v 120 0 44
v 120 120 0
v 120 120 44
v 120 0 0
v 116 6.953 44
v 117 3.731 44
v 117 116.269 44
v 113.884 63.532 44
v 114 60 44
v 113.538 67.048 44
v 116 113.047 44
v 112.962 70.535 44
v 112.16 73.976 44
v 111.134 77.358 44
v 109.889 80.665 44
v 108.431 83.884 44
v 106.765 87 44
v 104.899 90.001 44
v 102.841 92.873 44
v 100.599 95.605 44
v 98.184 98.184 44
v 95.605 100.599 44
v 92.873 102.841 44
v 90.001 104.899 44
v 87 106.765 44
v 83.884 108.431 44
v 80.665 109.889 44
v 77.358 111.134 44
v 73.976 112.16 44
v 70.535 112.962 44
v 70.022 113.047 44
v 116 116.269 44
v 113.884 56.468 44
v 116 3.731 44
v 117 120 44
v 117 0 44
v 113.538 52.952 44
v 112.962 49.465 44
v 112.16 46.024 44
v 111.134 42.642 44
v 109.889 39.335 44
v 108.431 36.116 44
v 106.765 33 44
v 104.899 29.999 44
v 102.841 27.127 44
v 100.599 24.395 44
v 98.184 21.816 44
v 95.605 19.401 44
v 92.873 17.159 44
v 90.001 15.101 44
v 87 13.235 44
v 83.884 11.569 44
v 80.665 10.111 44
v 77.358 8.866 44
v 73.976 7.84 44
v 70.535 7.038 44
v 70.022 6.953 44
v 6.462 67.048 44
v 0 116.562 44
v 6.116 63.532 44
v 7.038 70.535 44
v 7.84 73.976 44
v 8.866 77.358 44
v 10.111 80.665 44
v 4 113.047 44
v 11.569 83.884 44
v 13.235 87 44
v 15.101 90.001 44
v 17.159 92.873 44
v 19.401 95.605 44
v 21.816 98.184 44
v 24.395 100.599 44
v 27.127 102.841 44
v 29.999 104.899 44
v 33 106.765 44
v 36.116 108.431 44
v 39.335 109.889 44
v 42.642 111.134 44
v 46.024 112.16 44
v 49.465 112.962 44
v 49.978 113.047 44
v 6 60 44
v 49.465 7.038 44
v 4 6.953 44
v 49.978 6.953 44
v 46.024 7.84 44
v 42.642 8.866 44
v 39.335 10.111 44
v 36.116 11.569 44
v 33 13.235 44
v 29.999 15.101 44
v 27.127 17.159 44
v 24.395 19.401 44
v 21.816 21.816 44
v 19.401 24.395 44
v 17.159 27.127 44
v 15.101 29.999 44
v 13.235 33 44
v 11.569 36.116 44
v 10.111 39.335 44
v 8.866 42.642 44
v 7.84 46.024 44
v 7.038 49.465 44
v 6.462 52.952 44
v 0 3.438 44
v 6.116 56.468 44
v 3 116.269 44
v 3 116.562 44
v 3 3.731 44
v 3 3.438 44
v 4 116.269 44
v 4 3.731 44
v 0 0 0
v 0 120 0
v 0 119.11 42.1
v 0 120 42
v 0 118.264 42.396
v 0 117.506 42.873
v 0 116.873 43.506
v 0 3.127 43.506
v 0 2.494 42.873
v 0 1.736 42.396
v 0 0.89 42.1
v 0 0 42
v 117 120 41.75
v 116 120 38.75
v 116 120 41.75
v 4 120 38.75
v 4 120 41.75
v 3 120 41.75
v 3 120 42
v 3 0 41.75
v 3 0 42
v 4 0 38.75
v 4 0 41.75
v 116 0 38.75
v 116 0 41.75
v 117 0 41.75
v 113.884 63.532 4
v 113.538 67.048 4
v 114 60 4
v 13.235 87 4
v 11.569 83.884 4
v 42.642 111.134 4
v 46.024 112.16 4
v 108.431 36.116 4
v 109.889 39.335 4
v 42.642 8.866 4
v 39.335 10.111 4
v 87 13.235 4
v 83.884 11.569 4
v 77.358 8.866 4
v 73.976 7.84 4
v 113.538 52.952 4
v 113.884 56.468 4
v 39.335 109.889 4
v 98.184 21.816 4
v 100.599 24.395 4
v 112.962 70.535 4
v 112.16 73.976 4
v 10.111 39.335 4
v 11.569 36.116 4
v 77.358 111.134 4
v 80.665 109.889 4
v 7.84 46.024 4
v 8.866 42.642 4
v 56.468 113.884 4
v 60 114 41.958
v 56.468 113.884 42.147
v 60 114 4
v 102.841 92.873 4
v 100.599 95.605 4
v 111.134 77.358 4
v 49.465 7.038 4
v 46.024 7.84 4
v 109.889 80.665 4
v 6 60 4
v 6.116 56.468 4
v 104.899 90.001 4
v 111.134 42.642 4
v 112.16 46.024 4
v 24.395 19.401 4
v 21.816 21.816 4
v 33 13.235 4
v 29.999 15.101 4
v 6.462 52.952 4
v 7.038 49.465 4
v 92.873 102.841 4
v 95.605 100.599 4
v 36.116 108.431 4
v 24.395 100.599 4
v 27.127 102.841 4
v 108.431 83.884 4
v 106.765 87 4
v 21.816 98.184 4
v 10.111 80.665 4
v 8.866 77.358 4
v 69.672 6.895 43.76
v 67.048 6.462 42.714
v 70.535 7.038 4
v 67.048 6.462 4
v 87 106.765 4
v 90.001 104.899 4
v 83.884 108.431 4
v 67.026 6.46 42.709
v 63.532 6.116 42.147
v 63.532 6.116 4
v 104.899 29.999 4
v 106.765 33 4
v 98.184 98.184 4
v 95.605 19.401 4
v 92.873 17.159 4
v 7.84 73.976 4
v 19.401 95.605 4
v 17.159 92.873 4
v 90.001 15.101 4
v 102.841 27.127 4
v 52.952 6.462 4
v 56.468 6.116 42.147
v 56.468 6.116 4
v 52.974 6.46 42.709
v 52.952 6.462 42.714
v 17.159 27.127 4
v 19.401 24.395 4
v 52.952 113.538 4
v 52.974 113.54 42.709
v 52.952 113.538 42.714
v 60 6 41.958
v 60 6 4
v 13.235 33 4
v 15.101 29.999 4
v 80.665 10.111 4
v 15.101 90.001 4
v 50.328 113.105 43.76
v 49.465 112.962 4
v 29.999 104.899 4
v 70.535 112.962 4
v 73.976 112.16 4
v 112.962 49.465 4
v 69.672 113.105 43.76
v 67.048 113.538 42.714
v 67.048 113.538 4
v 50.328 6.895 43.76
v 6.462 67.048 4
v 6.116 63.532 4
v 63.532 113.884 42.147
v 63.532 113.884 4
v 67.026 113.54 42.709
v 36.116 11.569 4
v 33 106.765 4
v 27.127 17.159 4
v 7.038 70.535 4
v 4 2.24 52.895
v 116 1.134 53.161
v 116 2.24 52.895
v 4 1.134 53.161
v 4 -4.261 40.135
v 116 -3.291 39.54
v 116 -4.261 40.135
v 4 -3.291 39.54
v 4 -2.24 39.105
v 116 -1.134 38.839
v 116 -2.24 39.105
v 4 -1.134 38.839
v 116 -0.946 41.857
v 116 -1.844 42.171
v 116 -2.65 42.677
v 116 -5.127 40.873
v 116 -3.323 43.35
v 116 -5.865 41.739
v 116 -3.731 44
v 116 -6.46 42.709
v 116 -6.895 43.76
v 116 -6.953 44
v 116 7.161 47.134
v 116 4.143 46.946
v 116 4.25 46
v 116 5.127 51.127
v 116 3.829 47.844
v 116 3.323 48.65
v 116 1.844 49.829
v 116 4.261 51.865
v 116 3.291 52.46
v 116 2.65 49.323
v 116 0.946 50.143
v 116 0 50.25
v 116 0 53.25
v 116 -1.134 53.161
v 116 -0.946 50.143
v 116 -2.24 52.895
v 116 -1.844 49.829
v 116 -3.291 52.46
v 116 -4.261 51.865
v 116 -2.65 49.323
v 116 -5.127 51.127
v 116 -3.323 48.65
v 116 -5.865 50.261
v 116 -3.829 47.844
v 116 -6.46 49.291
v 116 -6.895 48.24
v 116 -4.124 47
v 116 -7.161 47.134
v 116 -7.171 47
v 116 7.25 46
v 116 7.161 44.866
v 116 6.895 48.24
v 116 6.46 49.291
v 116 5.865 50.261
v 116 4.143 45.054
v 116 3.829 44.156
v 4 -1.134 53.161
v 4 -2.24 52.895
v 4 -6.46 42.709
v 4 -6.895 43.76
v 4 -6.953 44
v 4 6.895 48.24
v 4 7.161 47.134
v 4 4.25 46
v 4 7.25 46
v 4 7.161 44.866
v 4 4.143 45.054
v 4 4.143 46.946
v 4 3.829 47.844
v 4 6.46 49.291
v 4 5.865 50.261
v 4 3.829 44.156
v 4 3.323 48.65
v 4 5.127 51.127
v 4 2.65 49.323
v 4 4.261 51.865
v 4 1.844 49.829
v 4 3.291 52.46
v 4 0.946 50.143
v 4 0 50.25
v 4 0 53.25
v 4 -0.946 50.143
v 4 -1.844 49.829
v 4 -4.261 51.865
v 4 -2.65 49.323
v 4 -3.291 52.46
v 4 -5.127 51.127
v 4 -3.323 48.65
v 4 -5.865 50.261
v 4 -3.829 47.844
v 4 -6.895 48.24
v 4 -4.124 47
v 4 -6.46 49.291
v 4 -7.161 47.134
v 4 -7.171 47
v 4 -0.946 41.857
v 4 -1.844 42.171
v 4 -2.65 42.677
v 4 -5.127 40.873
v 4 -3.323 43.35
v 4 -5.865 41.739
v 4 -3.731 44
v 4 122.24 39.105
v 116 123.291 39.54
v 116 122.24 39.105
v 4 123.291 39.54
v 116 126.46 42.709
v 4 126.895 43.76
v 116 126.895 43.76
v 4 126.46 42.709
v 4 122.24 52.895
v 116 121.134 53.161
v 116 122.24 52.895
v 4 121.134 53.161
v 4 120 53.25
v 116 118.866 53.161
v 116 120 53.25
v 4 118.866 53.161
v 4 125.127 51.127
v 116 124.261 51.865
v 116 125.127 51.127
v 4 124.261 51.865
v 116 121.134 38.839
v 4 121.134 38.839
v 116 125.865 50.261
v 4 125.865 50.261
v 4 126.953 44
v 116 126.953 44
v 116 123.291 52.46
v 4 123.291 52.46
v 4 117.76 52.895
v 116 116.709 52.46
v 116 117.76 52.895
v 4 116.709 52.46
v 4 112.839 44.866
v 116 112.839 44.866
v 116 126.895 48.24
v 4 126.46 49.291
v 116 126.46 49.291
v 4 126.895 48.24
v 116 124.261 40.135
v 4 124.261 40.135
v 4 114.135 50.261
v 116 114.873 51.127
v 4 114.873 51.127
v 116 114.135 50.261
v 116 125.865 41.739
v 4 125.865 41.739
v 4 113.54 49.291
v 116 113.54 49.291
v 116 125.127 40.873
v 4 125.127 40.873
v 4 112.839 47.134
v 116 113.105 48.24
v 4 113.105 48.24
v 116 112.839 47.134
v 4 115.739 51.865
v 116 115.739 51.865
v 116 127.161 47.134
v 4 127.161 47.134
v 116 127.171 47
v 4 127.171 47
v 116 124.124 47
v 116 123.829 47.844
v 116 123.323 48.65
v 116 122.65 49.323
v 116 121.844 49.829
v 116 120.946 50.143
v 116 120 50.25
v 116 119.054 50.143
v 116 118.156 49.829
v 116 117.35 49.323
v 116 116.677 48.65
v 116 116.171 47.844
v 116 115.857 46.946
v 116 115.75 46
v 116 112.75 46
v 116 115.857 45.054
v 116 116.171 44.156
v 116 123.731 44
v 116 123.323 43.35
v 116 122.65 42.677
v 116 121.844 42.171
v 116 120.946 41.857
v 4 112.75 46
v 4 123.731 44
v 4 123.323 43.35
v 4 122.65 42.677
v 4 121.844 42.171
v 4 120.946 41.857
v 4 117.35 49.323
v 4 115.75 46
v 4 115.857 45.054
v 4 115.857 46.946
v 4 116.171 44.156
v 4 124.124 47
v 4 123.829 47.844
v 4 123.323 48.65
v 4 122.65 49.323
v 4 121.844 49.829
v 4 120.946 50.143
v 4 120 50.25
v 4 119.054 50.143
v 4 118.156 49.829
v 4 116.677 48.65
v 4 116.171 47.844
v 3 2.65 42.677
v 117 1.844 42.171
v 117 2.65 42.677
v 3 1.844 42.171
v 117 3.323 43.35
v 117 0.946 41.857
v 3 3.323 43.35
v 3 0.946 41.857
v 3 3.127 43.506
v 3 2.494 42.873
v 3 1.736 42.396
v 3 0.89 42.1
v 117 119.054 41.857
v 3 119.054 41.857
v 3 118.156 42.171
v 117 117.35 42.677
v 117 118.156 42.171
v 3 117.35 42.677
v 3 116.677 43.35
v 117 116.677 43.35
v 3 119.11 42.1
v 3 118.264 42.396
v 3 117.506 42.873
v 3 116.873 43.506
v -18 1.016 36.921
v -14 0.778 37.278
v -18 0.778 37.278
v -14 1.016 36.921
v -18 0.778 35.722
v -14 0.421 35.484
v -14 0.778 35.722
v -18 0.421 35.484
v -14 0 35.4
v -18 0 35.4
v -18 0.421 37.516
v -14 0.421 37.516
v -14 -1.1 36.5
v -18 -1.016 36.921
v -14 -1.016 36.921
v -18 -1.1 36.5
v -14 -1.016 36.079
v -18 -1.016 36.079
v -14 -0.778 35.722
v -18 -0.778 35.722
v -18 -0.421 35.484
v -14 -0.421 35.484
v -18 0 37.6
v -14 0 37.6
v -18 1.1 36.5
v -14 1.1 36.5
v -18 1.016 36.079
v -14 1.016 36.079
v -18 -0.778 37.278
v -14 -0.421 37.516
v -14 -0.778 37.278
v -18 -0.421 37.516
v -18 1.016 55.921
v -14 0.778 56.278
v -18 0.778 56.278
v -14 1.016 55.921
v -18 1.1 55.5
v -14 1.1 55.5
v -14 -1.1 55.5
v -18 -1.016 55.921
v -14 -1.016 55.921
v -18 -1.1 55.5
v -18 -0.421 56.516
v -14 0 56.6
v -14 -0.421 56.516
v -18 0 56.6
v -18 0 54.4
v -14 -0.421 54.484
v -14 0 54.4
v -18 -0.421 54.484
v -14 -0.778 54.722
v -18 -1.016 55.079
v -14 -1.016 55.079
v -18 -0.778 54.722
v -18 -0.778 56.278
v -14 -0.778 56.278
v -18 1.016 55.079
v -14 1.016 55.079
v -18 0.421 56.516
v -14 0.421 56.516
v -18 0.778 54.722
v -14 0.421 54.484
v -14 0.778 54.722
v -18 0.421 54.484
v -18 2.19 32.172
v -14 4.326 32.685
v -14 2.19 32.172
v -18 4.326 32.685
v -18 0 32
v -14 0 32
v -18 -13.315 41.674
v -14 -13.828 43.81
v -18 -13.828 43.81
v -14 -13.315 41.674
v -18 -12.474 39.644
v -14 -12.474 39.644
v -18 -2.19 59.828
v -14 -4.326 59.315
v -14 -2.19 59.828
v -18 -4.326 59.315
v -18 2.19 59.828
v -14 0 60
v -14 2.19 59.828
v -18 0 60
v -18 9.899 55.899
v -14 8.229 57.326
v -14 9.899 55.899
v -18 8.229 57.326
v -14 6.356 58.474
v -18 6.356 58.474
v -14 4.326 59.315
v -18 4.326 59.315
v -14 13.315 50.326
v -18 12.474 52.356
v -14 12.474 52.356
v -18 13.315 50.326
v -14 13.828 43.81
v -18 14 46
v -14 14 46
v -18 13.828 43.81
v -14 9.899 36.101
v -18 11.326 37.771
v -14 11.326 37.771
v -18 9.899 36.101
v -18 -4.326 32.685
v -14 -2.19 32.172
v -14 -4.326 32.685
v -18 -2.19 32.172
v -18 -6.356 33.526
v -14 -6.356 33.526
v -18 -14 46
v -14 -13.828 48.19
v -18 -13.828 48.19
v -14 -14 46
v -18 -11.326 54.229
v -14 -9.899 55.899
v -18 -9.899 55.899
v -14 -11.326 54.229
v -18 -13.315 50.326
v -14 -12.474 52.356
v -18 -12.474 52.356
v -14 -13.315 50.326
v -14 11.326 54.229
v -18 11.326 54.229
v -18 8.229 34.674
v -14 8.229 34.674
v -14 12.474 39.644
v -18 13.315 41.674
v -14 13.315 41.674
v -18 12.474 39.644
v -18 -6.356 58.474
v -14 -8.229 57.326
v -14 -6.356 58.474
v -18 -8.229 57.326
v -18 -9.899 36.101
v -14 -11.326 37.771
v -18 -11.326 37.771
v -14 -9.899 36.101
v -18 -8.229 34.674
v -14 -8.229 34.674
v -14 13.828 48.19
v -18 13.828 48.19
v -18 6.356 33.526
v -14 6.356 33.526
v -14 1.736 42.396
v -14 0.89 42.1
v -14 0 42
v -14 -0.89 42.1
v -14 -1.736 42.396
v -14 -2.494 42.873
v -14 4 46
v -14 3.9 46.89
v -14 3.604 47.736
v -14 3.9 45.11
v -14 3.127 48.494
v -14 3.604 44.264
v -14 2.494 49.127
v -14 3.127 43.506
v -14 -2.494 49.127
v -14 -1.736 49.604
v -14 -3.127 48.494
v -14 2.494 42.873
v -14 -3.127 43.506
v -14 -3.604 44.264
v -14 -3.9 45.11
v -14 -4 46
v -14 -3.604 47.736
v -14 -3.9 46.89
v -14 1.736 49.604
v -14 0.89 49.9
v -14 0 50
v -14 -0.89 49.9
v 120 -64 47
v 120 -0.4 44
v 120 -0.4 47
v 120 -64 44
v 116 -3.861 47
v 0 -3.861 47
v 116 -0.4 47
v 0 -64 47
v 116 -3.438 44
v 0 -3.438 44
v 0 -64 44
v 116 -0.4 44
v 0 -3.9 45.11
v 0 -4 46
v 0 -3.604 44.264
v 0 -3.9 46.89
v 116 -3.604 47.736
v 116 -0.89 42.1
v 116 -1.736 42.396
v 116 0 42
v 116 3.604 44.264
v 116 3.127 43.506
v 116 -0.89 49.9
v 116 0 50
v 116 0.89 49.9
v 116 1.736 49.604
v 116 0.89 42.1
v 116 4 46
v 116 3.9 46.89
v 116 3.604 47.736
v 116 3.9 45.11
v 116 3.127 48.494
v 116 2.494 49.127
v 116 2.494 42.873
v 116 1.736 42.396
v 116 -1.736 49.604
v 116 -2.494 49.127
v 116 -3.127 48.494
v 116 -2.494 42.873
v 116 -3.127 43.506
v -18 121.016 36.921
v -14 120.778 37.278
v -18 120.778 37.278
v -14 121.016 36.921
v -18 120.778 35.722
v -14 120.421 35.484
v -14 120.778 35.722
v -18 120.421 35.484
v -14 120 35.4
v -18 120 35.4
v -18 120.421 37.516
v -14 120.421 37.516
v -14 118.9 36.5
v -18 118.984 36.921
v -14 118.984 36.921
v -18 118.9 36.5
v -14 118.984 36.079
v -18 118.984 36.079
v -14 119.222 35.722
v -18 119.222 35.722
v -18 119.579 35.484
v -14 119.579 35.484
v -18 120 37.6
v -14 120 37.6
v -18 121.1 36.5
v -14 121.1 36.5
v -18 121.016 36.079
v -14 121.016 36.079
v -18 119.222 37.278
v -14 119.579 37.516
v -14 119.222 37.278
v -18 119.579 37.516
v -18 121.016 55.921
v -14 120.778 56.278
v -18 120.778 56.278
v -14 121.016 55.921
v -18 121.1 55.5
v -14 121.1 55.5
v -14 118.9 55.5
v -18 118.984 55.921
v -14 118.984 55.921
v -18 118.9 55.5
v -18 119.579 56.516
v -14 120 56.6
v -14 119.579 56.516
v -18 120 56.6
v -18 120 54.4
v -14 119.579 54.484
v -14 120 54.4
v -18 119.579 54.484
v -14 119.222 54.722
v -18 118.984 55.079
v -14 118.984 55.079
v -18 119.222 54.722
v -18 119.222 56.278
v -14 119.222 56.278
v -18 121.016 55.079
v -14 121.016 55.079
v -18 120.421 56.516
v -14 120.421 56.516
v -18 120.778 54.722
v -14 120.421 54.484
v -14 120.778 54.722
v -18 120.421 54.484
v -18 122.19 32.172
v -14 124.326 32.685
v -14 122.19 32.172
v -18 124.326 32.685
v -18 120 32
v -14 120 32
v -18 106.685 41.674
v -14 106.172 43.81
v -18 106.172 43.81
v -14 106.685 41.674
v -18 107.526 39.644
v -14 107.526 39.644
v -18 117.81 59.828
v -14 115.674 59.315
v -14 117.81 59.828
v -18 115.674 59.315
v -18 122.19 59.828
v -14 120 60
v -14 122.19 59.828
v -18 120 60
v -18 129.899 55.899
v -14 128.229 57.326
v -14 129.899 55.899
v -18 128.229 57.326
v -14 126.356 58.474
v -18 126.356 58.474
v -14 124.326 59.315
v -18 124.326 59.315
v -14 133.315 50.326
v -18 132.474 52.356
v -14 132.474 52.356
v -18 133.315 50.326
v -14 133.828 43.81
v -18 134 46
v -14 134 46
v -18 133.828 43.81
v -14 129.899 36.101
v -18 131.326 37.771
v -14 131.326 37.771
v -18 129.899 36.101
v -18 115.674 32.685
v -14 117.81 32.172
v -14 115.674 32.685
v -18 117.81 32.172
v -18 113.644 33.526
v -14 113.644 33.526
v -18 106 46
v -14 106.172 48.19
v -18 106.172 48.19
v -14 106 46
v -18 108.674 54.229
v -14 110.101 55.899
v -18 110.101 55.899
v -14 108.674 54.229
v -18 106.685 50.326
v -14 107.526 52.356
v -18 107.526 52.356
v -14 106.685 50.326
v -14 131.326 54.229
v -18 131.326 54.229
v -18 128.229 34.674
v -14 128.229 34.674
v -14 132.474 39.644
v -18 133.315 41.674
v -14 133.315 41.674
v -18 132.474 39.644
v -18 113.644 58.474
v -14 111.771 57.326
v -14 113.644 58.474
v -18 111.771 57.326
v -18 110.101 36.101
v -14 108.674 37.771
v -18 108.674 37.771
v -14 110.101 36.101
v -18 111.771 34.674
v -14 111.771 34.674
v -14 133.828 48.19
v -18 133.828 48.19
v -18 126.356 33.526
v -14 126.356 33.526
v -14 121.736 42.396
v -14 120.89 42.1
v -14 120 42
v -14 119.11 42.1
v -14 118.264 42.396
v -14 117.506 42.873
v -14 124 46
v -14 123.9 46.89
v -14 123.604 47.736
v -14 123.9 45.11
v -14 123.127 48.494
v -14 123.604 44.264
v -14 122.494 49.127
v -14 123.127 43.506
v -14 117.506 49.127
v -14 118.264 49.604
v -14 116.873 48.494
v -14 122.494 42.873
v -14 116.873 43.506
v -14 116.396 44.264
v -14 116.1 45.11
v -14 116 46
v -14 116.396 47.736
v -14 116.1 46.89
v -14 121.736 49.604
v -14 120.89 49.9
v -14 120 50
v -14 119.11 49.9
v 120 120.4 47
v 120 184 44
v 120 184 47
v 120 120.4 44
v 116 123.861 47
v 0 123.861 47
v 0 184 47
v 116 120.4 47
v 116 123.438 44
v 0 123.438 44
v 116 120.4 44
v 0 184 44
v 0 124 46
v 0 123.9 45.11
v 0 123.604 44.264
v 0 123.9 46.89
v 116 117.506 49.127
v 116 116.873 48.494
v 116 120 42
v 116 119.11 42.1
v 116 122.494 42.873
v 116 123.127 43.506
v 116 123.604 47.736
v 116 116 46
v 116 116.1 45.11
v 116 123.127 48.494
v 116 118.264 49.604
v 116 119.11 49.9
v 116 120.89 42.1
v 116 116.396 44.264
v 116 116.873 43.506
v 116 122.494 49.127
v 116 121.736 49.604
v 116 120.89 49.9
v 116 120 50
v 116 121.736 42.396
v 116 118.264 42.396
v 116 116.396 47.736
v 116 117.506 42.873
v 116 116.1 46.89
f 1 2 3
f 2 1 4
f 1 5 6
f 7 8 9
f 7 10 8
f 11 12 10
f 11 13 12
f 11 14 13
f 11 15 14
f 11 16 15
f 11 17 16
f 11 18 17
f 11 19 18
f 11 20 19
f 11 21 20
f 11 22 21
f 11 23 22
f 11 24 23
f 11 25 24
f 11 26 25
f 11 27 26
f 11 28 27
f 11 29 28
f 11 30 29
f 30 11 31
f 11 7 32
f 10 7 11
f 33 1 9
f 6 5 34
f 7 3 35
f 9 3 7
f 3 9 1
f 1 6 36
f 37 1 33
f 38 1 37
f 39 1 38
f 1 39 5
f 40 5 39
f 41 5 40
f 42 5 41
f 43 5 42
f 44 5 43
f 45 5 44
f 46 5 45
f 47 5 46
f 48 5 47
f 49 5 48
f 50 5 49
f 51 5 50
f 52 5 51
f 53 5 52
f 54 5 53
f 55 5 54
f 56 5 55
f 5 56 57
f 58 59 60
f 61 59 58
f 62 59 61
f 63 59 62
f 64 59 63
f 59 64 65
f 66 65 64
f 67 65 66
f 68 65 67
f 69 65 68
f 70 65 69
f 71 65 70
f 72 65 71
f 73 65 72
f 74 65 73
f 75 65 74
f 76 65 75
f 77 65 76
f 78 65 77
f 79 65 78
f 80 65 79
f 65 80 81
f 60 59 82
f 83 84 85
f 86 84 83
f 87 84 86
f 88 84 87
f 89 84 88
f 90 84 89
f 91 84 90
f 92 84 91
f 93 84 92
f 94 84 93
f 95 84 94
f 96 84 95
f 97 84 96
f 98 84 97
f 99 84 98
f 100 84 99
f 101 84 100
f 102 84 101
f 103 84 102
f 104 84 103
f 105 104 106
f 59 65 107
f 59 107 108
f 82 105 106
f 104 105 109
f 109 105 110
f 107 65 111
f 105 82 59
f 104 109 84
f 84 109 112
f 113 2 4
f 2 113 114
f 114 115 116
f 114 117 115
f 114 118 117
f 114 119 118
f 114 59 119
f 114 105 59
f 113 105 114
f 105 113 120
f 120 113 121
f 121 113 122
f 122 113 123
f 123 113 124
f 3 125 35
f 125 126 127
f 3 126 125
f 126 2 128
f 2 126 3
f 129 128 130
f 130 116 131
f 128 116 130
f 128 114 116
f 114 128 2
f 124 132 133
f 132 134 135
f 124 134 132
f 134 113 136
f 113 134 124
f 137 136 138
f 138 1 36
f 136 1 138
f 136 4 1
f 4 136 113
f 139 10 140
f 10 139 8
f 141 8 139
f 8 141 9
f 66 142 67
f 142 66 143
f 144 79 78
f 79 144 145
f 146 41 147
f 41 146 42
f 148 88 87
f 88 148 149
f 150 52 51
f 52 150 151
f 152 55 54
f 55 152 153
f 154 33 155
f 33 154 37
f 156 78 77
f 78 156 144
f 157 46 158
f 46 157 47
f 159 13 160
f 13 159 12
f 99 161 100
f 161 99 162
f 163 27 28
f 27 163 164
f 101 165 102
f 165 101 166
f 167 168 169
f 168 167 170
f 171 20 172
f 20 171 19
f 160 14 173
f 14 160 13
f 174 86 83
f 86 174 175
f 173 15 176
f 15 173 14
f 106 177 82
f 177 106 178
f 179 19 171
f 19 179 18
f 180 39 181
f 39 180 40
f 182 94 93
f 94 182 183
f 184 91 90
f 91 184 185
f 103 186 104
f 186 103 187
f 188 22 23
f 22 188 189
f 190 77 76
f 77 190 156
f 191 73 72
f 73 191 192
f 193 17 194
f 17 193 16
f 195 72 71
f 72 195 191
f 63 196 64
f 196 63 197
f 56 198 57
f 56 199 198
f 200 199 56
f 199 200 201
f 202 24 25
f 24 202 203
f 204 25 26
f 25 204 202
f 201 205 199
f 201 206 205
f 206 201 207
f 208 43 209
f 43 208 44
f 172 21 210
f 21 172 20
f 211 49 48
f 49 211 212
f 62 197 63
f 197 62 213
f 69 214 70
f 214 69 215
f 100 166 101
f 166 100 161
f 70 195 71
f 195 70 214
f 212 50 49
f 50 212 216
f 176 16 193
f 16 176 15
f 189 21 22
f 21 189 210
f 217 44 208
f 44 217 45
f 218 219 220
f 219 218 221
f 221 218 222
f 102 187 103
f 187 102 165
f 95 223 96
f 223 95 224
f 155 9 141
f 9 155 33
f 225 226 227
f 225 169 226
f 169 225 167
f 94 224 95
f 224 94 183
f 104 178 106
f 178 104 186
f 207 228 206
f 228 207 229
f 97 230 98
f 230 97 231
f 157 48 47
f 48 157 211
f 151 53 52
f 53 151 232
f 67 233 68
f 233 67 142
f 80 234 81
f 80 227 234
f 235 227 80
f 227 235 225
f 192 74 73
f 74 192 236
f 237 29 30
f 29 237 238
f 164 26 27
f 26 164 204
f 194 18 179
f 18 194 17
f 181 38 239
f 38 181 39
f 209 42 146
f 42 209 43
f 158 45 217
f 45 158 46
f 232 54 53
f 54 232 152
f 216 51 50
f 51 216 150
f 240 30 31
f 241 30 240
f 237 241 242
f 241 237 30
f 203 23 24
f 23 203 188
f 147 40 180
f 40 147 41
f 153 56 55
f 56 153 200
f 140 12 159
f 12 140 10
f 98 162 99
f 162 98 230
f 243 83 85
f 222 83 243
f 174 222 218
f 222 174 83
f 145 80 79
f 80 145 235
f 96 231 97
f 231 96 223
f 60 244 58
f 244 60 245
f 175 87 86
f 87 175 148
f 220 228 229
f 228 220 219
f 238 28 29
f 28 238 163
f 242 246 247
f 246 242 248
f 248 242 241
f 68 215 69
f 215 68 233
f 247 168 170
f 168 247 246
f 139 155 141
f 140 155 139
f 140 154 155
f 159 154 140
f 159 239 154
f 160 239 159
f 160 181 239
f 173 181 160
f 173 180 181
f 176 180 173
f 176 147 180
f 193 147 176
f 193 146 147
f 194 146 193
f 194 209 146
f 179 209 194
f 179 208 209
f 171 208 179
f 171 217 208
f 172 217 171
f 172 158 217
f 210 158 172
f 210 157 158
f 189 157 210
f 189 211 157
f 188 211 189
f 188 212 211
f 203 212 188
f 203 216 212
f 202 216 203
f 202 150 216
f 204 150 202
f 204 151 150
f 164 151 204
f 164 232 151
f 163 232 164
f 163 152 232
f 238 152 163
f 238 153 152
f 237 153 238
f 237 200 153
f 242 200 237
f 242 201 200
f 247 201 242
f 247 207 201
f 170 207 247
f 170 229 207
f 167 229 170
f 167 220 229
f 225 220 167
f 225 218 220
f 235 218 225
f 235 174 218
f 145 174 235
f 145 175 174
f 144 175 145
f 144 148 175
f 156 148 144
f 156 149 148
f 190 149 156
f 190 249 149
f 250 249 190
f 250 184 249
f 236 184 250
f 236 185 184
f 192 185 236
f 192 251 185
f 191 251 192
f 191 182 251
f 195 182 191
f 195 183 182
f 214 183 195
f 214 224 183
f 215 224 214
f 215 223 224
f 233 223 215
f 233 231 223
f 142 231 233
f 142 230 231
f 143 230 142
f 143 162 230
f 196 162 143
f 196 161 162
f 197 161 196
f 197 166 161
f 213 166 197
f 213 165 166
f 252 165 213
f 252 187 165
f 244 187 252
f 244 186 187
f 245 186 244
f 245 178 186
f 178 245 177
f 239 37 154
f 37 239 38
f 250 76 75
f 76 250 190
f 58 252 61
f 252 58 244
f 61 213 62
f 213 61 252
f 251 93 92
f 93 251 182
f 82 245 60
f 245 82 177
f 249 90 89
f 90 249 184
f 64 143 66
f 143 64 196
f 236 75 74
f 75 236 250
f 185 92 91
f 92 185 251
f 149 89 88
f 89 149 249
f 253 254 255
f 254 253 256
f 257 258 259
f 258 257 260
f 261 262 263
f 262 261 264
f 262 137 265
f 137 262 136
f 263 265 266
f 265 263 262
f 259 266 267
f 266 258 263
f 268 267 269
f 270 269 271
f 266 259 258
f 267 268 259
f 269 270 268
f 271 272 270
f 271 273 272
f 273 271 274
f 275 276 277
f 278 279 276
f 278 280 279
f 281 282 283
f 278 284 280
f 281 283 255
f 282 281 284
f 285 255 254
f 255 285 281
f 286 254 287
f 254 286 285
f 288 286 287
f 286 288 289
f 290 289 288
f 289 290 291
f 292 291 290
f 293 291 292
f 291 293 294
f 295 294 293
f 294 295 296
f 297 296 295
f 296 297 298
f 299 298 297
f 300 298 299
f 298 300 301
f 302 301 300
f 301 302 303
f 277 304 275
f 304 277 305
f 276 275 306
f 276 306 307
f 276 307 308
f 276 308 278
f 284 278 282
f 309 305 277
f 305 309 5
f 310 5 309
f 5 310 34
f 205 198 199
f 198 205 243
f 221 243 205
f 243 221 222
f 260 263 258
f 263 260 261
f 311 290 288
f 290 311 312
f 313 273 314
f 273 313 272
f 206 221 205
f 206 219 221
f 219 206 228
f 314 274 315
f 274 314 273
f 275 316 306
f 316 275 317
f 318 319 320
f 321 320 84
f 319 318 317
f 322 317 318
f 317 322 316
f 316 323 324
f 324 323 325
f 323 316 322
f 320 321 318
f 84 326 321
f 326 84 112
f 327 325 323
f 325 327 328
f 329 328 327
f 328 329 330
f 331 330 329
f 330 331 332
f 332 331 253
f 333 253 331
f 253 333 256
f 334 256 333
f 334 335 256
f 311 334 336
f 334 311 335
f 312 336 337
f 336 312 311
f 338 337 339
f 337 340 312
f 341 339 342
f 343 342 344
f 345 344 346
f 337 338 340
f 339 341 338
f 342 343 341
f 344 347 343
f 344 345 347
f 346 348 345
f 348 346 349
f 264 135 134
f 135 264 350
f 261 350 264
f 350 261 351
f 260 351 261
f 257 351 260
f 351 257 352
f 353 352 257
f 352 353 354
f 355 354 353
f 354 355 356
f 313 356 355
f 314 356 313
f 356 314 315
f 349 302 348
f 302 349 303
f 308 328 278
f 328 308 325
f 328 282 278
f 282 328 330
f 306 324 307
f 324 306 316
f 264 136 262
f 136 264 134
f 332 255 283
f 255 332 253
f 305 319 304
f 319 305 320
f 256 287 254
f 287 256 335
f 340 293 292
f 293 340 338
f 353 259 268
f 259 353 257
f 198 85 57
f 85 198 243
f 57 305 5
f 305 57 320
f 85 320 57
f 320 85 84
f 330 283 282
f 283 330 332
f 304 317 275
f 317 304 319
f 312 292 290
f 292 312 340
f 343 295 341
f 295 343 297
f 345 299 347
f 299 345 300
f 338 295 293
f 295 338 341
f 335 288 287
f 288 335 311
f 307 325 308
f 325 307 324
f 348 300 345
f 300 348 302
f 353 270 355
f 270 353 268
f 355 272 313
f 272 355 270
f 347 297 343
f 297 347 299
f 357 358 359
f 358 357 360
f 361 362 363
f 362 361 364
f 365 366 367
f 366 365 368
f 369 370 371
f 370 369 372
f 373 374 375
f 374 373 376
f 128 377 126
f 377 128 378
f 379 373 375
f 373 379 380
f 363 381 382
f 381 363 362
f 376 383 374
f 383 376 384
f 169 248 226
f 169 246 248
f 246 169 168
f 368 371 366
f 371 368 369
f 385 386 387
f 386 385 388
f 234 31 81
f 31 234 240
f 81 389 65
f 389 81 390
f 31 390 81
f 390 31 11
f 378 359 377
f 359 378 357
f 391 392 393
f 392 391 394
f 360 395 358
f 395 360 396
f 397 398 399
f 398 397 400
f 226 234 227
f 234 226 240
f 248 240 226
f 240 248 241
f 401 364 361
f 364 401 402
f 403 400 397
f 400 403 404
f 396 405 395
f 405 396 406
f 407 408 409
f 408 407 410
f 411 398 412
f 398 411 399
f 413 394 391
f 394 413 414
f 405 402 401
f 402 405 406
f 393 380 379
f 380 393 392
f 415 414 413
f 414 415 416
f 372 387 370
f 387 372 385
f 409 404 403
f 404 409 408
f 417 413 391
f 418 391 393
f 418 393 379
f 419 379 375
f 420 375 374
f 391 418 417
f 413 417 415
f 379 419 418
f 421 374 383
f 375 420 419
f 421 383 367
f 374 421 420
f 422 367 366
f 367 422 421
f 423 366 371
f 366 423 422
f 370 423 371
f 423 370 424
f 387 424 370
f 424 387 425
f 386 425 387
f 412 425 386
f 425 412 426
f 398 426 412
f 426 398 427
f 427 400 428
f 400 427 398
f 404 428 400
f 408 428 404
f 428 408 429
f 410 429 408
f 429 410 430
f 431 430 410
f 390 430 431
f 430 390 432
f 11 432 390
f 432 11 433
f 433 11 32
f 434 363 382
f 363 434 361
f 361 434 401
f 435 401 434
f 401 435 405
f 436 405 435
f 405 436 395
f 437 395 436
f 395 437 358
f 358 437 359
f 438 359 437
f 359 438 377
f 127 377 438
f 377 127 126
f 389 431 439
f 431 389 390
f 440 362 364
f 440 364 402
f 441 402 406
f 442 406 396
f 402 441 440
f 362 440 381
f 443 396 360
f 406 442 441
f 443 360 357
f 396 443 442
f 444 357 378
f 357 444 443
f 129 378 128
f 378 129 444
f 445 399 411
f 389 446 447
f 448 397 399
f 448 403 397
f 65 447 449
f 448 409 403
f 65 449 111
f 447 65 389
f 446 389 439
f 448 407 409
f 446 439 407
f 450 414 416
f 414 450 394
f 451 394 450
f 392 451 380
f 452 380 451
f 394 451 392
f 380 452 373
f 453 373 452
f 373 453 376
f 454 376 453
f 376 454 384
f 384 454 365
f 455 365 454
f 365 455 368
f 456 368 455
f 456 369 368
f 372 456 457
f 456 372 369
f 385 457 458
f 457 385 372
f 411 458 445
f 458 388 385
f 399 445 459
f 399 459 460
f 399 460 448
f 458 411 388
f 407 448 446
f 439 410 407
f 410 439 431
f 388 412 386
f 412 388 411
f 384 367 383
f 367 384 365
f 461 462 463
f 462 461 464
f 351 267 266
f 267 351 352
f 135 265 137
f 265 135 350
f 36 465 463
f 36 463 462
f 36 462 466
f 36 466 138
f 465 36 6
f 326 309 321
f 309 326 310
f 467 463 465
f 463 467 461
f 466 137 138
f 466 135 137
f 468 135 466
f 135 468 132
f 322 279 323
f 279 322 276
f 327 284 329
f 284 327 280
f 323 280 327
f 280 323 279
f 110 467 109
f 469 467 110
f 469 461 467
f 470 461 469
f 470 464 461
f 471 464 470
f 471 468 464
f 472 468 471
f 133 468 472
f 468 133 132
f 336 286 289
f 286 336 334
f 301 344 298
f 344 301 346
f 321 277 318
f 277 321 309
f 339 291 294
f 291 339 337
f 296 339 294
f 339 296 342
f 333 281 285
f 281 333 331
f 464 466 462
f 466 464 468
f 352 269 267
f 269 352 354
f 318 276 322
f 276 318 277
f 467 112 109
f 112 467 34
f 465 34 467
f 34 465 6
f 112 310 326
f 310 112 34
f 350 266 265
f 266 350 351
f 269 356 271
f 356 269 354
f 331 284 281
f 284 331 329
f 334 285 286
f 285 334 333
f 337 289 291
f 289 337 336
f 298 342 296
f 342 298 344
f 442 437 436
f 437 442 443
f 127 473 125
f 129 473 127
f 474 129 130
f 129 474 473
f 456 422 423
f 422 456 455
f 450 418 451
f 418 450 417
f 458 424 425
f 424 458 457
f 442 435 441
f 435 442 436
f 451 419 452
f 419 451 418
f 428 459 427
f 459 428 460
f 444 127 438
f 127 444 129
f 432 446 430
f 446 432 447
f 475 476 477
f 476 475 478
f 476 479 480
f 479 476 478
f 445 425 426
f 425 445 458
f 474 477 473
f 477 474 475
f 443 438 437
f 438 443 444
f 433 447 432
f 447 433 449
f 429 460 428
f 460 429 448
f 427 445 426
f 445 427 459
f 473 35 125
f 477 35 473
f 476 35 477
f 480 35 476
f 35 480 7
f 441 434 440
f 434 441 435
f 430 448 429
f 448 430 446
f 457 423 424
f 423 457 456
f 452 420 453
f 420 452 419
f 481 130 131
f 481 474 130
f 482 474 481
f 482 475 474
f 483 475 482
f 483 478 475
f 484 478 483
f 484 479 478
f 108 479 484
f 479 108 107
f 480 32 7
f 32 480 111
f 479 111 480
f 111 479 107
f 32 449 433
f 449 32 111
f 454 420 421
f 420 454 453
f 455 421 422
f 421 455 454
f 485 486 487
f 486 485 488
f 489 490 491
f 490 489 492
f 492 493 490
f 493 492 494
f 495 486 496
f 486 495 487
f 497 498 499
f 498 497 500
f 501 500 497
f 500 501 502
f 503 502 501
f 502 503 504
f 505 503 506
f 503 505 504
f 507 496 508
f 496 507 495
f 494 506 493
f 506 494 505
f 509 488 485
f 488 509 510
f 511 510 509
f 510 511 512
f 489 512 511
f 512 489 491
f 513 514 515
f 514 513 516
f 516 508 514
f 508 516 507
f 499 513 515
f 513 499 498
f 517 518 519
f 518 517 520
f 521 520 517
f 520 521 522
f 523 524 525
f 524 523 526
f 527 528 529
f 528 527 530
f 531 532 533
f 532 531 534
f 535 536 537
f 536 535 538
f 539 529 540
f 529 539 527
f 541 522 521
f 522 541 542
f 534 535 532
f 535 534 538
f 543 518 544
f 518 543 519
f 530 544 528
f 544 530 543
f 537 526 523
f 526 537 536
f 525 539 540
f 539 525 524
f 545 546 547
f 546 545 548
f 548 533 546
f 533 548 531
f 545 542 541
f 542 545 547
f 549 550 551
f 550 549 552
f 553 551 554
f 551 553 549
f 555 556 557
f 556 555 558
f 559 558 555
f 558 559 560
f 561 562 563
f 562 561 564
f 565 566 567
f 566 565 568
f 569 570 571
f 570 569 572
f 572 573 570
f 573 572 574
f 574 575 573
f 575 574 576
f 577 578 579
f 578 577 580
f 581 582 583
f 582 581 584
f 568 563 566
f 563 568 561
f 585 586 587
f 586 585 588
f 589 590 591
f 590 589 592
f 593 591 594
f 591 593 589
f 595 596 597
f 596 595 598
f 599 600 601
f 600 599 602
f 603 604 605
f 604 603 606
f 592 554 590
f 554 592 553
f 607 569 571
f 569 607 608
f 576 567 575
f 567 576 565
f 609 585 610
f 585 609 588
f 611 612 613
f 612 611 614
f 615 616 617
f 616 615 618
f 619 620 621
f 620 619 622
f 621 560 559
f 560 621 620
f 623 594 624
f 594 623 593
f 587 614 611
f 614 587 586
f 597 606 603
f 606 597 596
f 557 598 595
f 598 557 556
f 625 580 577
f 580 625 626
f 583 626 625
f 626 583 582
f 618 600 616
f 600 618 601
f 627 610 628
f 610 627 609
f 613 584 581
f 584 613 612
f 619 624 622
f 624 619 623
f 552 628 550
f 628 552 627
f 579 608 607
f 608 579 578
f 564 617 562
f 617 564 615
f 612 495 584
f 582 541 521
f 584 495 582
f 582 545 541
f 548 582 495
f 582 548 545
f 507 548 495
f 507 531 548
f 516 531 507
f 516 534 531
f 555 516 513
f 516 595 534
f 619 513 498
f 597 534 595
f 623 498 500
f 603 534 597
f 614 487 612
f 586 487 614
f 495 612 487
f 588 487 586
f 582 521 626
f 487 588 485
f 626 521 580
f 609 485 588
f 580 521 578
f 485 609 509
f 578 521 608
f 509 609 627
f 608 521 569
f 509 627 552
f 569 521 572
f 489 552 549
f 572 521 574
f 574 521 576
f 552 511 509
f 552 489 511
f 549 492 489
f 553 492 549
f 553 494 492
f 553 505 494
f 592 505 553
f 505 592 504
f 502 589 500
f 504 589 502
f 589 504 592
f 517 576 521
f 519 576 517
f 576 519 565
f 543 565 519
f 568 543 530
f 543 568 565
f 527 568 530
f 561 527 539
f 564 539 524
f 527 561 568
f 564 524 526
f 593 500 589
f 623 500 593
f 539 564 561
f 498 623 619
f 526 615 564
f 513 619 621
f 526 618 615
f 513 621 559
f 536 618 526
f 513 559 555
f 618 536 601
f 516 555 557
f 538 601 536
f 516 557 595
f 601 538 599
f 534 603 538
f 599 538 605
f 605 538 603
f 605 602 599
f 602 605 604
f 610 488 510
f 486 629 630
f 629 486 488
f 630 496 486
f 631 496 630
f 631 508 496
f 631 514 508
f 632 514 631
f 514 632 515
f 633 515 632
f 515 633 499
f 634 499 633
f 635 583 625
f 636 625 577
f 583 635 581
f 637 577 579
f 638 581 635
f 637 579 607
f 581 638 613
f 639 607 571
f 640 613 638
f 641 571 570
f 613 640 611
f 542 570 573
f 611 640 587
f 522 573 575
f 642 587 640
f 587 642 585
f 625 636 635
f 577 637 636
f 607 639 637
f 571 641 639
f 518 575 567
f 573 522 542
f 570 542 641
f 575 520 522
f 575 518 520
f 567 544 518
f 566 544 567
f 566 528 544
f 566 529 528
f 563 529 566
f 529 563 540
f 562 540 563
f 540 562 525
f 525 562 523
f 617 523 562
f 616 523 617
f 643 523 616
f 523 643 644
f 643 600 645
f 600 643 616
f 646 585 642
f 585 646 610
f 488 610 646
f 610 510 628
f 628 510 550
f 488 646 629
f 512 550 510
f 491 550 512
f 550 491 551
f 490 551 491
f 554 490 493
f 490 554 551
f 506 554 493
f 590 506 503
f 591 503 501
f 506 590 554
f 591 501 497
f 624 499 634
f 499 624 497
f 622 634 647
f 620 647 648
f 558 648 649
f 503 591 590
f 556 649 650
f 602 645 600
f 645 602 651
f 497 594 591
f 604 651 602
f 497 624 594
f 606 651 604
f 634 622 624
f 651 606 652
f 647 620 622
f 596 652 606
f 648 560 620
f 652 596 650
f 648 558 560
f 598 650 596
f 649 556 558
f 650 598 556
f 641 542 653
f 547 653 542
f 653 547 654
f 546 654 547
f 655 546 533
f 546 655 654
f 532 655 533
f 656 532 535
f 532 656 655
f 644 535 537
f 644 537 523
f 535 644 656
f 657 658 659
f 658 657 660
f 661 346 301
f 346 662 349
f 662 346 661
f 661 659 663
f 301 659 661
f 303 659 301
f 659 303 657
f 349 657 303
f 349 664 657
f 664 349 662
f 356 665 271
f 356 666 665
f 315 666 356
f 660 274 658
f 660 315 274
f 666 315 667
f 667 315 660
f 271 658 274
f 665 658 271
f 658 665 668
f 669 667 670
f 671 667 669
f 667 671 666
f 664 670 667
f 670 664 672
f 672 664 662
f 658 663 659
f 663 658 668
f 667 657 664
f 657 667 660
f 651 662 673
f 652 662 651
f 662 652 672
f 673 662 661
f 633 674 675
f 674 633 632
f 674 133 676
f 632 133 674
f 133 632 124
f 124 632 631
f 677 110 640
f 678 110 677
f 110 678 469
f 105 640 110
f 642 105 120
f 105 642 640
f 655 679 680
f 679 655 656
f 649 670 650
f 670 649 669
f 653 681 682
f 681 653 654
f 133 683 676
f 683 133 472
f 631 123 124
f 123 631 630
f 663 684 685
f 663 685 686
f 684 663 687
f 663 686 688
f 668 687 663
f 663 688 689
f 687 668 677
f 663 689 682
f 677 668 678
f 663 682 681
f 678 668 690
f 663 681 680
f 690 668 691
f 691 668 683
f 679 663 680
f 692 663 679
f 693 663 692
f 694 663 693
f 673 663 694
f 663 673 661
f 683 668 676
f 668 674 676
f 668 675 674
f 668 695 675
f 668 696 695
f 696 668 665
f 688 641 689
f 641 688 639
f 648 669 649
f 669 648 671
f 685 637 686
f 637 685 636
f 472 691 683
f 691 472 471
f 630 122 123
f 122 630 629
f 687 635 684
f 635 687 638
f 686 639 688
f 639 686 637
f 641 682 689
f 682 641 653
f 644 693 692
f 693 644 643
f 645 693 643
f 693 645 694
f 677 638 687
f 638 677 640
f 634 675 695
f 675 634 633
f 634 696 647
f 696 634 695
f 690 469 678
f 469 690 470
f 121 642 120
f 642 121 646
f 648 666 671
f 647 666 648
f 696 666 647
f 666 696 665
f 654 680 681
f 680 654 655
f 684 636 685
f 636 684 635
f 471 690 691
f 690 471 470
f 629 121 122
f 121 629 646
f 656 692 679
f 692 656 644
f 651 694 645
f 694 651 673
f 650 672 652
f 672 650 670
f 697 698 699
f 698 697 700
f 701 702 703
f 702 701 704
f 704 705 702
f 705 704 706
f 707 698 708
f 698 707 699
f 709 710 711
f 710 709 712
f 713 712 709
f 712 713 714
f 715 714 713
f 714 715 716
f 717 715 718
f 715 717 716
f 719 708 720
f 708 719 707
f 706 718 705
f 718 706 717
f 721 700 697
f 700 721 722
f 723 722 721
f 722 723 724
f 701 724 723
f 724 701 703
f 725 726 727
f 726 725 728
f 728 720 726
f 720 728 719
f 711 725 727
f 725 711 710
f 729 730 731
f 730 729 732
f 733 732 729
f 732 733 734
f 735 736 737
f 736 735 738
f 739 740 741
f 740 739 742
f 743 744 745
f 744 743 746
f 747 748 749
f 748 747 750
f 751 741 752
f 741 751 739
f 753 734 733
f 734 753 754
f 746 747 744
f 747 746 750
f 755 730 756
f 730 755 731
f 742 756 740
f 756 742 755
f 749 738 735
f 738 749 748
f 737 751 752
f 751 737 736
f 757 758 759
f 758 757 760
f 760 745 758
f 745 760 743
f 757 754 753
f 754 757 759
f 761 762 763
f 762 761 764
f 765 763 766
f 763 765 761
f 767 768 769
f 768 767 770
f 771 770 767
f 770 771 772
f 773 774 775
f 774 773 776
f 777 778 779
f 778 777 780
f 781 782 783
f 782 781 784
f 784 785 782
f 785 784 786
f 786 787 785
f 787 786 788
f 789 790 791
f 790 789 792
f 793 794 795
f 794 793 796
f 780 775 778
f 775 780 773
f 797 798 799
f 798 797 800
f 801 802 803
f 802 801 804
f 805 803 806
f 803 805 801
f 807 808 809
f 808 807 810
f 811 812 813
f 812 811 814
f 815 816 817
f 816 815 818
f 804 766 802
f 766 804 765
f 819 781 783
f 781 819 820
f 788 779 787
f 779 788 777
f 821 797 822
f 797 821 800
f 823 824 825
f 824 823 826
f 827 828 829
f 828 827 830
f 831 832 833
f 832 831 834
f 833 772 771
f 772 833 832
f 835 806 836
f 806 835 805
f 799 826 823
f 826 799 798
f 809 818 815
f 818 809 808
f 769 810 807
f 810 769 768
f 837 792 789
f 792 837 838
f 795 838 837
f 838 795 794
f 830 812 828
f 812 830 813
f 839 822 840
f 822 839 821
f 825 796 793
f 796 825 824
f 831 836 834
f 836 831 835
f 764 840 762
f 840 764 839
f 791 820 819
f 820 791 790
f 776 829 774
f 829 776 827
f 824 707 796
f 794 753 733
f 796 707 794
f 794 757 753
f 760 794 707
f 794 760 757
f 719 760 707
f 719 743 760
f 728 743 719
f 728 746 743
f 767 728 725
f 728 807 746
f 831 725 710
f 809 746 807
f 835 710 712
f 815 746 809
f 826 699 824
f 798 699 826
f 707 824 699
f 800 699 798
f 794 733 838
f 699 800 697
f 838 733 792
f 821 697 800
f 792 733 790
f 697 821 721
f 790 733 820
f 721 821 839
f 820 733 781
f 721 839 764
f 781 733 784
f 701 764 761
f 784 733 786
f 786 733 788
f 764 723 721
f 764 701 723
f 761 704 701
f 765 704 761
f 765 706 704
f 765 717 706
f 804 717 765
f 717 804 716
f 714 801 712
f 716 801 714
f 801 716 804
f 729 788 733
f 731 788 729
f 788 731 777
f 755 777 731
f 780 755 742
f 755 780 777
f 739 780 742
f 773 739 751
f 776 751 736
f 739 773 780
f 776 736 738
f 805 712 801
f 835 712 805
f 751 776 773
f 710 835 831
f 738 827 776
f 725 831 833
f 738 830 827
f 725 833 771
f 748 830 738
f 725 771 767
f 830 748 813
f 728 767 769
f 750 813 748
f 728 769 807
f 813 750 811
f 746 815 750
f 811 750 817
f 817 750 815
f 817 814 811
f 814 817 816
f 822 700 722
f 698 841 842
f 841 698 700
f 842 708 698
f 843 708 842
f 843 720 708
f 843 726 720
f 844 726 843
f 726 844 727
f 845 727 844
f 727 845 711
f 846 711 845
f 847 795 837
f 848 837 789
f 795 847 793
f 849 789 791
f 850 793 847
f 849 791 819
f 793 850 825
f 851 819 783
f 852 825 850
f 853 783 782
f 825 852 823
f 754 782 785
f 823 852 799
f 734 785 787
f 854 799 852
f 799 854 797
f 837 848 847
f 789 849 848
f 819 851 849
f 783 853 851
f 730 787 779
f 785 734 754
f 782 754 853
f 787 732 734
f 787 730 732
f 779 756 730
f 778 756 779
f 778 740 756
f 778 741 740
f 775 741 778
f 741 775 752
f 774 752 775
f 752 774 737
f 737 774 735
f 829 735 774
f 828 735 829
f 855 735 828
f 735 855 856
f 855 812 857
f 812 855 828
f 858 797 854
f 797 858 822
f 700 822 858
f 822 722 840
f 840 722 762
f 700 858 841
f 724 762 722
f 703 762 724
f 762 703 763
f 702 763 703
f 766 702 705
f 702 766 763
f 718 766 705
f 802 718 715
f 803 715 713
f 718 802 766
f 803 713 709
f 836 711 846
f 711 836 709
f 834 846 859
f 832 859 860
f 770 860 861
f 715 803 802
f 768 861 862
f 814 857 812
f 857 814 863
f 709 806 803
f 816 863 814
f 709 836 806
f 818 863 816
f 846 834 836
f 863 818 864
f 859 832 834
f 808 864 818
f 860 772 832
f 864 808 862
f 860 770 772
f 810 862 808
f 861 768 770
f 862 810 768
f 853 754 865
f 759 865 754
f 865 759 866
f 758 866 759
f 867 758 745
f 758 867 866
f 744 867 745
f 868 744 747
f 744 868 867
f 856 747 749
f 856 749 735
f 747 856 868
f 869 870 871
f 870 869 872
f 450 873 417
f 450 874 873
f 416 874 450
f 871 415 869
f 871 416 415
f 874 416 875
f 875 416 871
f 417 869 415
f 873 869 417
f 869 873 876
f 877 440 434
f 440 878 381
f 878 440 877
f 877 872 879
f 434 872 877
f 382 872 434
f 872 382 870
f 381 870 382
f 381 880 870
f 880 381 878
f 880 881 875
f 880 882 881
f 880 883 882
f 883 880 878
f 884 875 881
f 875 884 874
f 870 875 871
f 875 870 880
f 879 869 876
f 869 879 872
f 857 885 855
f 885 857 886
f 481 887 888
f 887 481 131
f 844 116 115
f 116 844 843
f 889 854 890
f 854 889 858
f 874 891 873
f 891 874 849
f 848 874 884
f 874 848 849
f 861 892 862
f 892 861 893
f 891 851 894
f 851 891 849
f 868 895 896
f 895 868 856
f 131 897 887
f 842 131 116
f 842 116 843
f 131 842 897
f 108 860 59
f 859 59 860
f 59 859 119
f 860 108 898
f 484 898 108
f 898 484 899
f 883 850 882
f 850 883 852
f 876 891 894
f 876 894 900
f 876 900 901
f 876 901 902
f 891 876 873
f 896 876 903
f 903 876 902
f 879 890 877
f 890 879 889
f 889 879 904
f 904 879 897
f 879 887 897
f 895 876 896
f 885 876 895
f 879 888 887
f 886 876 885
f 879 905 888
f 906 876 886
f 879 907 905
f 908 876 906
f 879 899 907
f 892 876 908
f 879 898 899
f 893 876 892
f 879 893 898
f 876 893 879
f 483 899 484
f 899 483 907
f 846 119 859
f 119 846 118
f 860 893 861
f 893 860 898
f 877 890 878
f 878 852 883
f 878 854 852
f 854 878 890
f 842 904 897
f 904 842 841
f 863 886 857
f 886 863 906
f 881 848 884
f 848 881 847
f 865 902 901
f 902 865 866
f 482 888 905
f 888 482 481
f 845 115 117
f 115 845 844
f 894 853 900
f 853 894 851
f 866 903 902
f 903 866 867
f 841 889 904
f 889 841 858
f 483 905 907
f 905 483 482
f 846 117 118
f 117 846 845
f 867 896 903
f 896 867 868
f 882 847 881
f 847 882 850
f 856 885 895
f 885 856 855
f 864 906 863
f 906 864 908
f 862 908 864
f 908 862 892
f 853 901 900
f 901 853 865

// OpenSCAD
// file: hinge_v4.scad
// ============================================================
// hinge_v4.scad — print-in-place barrel, no gap (single combined print)
// ============================================================
include <params_v4.scad>

module pin_barrel(len) {
    rotate([0, 90, 0])
        cylinder(d = PIN_D, h = len, $fn = 28);
}

// Outer shell and bore are kept SEPARATE (not pre-hollowed) so the caller
// can union all the outer-shell material (including the part embedded in
// the base block) first, then subtract the bore as one final step. If the
// bore is cut locally inside this module, unioning the resulting tube onto
// the base block does NOT drill through the base's own solid material
// where they overlap — union never retroactively removes material.
module socket_outer(len) {
    rotate([0, 90, 0])
        cylinder(d = SOCKET_OD, h = len, $fn = 40);
}

module socket_bore(len) {
    rotate([0, 90, 0])
        cylinder(d = SOCKET_ID, h = len, $fn = 28);
}

// convenience wrapper for standalone use/testing (properly hollowed)
module socket_barrel(len) {
    difference() {
        socket_outer(len);
        socket_bore(len);
    }
}
// file: params_v4.scad
// ============================================================
// params_v4.scad — print-in-place hinge, single continuous barrel
// Base + both flaps print together as ONE piece, flat/open (like
// the reference box), then fold closed by hand after printing.
// No rod, no pins, no hardware, no snap-assembly step.
// ============================================================
$fn = 64;

// ---- Bowl ----
BOWL_DIA      = 108;
BOWL_DEPTH    = 40;
BOWL_RADIUS   = BOWL_DIA / 2;

// ---- Base block ----
WALL          = 6;
FLOOR_T       = 4;
BASE_SIZE     = BOWL_DIA + 2 * WALL;     // 120mm square
BASE_HEIGHT   = BOWL_DEPTH + FLOOR_T;    // 44mm

// ---- Flap ----
FLAP_LEN      = BASE_SIZE;
FLAP_OVERLAP  = 4;
FLAP_DEPTH    = BASE_SIZE / 2 + FLAP_OVERLAP;
FLAP_T        = 3;

// ---- Print-in-place barrel hinge ----
PIN_D         = 8;                  // pin diameter
SOCKET_CLEAR  = 0.5;                // total diametral clearance (tune per printer/material)
SOCKET_ID     = PIN_D + SOCKET_CLEAR;
SOCKET_SHELL  = 3;
SOCKET_OD     = SOCKET_ID + 2 * SOCKET_SHELL;
END_MARGIN    = 4;                  // inset from each end of the edge
BARREL_LEN    = FLAP_LEN - 2 * END_MARGIN;   // socket length (both hinges)

// reinforcement ridge so the thin panel/base have enough material to embed the pin
PAD_DEPTH     = 10;
FLAP_PAD_H    = PIN_D + 2;
// HINGE_Z is set so the pin/socket genuinely overlaps into both the base
// block and the flap panel (a few mm of real volumetric overlap) rather
// than sitting exactly tangent to a flat face — exact tangency between
// separate solids is a classic non-manifold CSG trap.
HINGE_EMBED   = 2;  // how far the joint dips below the base's top surface
HINGE_Z       = BASE_HEIGHT + HINGE_EMBED;

// small relief gap so the flap panel doesn't touch the base along a bare
// edge (that kind of zero-area contact causes non-manifold CSG results,
// and physically the panel doesn't need to touch — only the pin/socket
// joint should connect the two pieces).
HINGE_GAP     = 0.4;
BASE_PAD_H    = (HINGE_Z - BASE_HEIGHT) + SOCKET_OD / 2 + 2;

// ---- Servo drive extension (flap's pin extends past the base to meet the horn) ----
SERVO_EXT_LEN = 22;                 // how far the pin extends past the base edge
SERVO_HORN_OD = 24;                 // verify with calipers
SERVO_HORN_BOLT_CIRCLE = 19;        // verify with calipers
SERVO_BOSS_D  = SERVO_HORN_OD + 4;
SERVO_BOSS_T  = 4;
M3_CLEAR      = 3.4;

// ---- MG996R servo body (for the separate bracket — still a physical part) ----
SERVO_W       = 40.7;
SERVO_D       = 19.7;
SERVO_H       = 42.9;
SERVO_SHAFT_OFFSET = 30.9;
// main file
// ============================================================
// 10_combined_v4.scad — ONE PIECE: base + both flaps, flat/open
// Print exactly as modeled (flat, pocket up) — hinges are already
// assembled by the print itself. Fold each flap closed by hand
// after printing (PETG flexes enough at this pin diameter; do a
// few slow open/close cycles right off the bed while it's still
// slightly warm to work the joint in).
//
// Each flap's pin extends past one end of the base to meet a
// servo horn directly — see SERVO_EXT_LEN in params_v4.scad.
// ============================================================
include <params_v4.scad>
include <hinge_v4.scad>

// ---------------- Base ----------------
module base_block() {
    difference() {
        cube([BASE_SIZE, BASE_SIZE, BASE_HEIGHT]);
        translate([BASE_SIZE / 2, BASE_SIZE / 2, FLOOR_T])
            cylinder(r = BOWL_RADIUS, h = BOWL_DEPTH + 1, $fn = 96);
    }
}

module base_socket_shell(edge) {
    if (edge == "front")
        translate([END_MARGIN, 0, HINGE_Z])
            socket_outer(BARREL_LEN);
    else
        translate([END_MARGIN, BASE_SIZE, HINGE_Z])
            socket_outer(BARREL_LEN);
}

module base_socket_bore(edge) {
    // extended slightly past both ends for a clean cut
    if (edge == "front")
        translate([END_MARGIN - 1, 0, HINGE_Z])
            socket_bore(BARREL_LEN + 2);
    else
        translate([END_MARGIN - 1, BASE_SIZE, HINGE_Z])
            socket_bore(BARREL_LEN + 2);
}

// base_block + both socket shells, unioned, THEN both bores cut through
// everything at once — this is what gives the pin real clearance even in
// the region where the socket is embedded inside the base block.
module base_assembly() {
    difference() {
        union() {
            base_block();
            base_socket_shell("front");
            base_socket_shell("back");
        }
        base_socket_bore("front");
        base_socket_bore("back");
    }
}

// ---------------- Flap (flat/open pose) ----------------
// front flap occupies Y: -FLAP_DEPTH..0 ; back flap occupies Y: BASE_SIZE..BASE_SIZE+FLAP_DEPTH
module flap_panel(edge) {
    if (edge == "front")
        translate([0, -FLAP_DEPTH, BASE_HEIGHT])
            cube([FLAP_LEN, FLAP_DEPTH - HINGE_GAP, FLAP_T]);
    else
        translate([0, BASE_SIZE + HINGE_GAP, BASE_HEIGHT])
            cube([FLAP_LEN, FLAP_DEPTH - HINGE_GAP, FLAP_T]);
}

// pin extends SERVO_EXT_LEN past the low-X end to reach the servo horn
module flap_pin(edge) {
    total_len = BARREL_LEN + SERVO_EXT_LEN;
    start_x = END_MARGIN - SERVO_EXT_LEN;
    if (edge == "front")
        translate([start_x, 0, HINGE_Z])
            pin_barrel(total_len);
    else
        translate([start_x, BASE_SIZE, HINGE_Z])
            pin_barrel(total_len);
}

module horn_boss(edge) {
    x = END_MARGIN - SERVO_EXT_LEN;
    y = (edge == "front") ? 0 : BASE_SIZE;
    translate([x, y, HINGE_Z])
        rotate([0, 90, 0])
        difference() {
            cylinder(d = SERVO_BOSS_D, h = SERVO_BOSS_T, $fn = 40);
            for (a = [0, 180])
                rotate([0, 0, a])
                    translate([SERVO_HORN_BOLT_CIRCLE / 2, 0, -0.1])
                        cylinder(d = 2.2, h = SERVO_BOSS_T + 0.2, $fn = 16); // horn screw holes, verify size
        }
}

module flap_assembly(edge) {
    flap_panel(edge);
    flap_pin(edge);
    horn_boss(edge);
}

// ---------------- Full combined piece ----------------
module combined_assembly() {
    base_assembly();
    flap_assembly("front");
    flap_assembly("back");
}

combined_assembly();
